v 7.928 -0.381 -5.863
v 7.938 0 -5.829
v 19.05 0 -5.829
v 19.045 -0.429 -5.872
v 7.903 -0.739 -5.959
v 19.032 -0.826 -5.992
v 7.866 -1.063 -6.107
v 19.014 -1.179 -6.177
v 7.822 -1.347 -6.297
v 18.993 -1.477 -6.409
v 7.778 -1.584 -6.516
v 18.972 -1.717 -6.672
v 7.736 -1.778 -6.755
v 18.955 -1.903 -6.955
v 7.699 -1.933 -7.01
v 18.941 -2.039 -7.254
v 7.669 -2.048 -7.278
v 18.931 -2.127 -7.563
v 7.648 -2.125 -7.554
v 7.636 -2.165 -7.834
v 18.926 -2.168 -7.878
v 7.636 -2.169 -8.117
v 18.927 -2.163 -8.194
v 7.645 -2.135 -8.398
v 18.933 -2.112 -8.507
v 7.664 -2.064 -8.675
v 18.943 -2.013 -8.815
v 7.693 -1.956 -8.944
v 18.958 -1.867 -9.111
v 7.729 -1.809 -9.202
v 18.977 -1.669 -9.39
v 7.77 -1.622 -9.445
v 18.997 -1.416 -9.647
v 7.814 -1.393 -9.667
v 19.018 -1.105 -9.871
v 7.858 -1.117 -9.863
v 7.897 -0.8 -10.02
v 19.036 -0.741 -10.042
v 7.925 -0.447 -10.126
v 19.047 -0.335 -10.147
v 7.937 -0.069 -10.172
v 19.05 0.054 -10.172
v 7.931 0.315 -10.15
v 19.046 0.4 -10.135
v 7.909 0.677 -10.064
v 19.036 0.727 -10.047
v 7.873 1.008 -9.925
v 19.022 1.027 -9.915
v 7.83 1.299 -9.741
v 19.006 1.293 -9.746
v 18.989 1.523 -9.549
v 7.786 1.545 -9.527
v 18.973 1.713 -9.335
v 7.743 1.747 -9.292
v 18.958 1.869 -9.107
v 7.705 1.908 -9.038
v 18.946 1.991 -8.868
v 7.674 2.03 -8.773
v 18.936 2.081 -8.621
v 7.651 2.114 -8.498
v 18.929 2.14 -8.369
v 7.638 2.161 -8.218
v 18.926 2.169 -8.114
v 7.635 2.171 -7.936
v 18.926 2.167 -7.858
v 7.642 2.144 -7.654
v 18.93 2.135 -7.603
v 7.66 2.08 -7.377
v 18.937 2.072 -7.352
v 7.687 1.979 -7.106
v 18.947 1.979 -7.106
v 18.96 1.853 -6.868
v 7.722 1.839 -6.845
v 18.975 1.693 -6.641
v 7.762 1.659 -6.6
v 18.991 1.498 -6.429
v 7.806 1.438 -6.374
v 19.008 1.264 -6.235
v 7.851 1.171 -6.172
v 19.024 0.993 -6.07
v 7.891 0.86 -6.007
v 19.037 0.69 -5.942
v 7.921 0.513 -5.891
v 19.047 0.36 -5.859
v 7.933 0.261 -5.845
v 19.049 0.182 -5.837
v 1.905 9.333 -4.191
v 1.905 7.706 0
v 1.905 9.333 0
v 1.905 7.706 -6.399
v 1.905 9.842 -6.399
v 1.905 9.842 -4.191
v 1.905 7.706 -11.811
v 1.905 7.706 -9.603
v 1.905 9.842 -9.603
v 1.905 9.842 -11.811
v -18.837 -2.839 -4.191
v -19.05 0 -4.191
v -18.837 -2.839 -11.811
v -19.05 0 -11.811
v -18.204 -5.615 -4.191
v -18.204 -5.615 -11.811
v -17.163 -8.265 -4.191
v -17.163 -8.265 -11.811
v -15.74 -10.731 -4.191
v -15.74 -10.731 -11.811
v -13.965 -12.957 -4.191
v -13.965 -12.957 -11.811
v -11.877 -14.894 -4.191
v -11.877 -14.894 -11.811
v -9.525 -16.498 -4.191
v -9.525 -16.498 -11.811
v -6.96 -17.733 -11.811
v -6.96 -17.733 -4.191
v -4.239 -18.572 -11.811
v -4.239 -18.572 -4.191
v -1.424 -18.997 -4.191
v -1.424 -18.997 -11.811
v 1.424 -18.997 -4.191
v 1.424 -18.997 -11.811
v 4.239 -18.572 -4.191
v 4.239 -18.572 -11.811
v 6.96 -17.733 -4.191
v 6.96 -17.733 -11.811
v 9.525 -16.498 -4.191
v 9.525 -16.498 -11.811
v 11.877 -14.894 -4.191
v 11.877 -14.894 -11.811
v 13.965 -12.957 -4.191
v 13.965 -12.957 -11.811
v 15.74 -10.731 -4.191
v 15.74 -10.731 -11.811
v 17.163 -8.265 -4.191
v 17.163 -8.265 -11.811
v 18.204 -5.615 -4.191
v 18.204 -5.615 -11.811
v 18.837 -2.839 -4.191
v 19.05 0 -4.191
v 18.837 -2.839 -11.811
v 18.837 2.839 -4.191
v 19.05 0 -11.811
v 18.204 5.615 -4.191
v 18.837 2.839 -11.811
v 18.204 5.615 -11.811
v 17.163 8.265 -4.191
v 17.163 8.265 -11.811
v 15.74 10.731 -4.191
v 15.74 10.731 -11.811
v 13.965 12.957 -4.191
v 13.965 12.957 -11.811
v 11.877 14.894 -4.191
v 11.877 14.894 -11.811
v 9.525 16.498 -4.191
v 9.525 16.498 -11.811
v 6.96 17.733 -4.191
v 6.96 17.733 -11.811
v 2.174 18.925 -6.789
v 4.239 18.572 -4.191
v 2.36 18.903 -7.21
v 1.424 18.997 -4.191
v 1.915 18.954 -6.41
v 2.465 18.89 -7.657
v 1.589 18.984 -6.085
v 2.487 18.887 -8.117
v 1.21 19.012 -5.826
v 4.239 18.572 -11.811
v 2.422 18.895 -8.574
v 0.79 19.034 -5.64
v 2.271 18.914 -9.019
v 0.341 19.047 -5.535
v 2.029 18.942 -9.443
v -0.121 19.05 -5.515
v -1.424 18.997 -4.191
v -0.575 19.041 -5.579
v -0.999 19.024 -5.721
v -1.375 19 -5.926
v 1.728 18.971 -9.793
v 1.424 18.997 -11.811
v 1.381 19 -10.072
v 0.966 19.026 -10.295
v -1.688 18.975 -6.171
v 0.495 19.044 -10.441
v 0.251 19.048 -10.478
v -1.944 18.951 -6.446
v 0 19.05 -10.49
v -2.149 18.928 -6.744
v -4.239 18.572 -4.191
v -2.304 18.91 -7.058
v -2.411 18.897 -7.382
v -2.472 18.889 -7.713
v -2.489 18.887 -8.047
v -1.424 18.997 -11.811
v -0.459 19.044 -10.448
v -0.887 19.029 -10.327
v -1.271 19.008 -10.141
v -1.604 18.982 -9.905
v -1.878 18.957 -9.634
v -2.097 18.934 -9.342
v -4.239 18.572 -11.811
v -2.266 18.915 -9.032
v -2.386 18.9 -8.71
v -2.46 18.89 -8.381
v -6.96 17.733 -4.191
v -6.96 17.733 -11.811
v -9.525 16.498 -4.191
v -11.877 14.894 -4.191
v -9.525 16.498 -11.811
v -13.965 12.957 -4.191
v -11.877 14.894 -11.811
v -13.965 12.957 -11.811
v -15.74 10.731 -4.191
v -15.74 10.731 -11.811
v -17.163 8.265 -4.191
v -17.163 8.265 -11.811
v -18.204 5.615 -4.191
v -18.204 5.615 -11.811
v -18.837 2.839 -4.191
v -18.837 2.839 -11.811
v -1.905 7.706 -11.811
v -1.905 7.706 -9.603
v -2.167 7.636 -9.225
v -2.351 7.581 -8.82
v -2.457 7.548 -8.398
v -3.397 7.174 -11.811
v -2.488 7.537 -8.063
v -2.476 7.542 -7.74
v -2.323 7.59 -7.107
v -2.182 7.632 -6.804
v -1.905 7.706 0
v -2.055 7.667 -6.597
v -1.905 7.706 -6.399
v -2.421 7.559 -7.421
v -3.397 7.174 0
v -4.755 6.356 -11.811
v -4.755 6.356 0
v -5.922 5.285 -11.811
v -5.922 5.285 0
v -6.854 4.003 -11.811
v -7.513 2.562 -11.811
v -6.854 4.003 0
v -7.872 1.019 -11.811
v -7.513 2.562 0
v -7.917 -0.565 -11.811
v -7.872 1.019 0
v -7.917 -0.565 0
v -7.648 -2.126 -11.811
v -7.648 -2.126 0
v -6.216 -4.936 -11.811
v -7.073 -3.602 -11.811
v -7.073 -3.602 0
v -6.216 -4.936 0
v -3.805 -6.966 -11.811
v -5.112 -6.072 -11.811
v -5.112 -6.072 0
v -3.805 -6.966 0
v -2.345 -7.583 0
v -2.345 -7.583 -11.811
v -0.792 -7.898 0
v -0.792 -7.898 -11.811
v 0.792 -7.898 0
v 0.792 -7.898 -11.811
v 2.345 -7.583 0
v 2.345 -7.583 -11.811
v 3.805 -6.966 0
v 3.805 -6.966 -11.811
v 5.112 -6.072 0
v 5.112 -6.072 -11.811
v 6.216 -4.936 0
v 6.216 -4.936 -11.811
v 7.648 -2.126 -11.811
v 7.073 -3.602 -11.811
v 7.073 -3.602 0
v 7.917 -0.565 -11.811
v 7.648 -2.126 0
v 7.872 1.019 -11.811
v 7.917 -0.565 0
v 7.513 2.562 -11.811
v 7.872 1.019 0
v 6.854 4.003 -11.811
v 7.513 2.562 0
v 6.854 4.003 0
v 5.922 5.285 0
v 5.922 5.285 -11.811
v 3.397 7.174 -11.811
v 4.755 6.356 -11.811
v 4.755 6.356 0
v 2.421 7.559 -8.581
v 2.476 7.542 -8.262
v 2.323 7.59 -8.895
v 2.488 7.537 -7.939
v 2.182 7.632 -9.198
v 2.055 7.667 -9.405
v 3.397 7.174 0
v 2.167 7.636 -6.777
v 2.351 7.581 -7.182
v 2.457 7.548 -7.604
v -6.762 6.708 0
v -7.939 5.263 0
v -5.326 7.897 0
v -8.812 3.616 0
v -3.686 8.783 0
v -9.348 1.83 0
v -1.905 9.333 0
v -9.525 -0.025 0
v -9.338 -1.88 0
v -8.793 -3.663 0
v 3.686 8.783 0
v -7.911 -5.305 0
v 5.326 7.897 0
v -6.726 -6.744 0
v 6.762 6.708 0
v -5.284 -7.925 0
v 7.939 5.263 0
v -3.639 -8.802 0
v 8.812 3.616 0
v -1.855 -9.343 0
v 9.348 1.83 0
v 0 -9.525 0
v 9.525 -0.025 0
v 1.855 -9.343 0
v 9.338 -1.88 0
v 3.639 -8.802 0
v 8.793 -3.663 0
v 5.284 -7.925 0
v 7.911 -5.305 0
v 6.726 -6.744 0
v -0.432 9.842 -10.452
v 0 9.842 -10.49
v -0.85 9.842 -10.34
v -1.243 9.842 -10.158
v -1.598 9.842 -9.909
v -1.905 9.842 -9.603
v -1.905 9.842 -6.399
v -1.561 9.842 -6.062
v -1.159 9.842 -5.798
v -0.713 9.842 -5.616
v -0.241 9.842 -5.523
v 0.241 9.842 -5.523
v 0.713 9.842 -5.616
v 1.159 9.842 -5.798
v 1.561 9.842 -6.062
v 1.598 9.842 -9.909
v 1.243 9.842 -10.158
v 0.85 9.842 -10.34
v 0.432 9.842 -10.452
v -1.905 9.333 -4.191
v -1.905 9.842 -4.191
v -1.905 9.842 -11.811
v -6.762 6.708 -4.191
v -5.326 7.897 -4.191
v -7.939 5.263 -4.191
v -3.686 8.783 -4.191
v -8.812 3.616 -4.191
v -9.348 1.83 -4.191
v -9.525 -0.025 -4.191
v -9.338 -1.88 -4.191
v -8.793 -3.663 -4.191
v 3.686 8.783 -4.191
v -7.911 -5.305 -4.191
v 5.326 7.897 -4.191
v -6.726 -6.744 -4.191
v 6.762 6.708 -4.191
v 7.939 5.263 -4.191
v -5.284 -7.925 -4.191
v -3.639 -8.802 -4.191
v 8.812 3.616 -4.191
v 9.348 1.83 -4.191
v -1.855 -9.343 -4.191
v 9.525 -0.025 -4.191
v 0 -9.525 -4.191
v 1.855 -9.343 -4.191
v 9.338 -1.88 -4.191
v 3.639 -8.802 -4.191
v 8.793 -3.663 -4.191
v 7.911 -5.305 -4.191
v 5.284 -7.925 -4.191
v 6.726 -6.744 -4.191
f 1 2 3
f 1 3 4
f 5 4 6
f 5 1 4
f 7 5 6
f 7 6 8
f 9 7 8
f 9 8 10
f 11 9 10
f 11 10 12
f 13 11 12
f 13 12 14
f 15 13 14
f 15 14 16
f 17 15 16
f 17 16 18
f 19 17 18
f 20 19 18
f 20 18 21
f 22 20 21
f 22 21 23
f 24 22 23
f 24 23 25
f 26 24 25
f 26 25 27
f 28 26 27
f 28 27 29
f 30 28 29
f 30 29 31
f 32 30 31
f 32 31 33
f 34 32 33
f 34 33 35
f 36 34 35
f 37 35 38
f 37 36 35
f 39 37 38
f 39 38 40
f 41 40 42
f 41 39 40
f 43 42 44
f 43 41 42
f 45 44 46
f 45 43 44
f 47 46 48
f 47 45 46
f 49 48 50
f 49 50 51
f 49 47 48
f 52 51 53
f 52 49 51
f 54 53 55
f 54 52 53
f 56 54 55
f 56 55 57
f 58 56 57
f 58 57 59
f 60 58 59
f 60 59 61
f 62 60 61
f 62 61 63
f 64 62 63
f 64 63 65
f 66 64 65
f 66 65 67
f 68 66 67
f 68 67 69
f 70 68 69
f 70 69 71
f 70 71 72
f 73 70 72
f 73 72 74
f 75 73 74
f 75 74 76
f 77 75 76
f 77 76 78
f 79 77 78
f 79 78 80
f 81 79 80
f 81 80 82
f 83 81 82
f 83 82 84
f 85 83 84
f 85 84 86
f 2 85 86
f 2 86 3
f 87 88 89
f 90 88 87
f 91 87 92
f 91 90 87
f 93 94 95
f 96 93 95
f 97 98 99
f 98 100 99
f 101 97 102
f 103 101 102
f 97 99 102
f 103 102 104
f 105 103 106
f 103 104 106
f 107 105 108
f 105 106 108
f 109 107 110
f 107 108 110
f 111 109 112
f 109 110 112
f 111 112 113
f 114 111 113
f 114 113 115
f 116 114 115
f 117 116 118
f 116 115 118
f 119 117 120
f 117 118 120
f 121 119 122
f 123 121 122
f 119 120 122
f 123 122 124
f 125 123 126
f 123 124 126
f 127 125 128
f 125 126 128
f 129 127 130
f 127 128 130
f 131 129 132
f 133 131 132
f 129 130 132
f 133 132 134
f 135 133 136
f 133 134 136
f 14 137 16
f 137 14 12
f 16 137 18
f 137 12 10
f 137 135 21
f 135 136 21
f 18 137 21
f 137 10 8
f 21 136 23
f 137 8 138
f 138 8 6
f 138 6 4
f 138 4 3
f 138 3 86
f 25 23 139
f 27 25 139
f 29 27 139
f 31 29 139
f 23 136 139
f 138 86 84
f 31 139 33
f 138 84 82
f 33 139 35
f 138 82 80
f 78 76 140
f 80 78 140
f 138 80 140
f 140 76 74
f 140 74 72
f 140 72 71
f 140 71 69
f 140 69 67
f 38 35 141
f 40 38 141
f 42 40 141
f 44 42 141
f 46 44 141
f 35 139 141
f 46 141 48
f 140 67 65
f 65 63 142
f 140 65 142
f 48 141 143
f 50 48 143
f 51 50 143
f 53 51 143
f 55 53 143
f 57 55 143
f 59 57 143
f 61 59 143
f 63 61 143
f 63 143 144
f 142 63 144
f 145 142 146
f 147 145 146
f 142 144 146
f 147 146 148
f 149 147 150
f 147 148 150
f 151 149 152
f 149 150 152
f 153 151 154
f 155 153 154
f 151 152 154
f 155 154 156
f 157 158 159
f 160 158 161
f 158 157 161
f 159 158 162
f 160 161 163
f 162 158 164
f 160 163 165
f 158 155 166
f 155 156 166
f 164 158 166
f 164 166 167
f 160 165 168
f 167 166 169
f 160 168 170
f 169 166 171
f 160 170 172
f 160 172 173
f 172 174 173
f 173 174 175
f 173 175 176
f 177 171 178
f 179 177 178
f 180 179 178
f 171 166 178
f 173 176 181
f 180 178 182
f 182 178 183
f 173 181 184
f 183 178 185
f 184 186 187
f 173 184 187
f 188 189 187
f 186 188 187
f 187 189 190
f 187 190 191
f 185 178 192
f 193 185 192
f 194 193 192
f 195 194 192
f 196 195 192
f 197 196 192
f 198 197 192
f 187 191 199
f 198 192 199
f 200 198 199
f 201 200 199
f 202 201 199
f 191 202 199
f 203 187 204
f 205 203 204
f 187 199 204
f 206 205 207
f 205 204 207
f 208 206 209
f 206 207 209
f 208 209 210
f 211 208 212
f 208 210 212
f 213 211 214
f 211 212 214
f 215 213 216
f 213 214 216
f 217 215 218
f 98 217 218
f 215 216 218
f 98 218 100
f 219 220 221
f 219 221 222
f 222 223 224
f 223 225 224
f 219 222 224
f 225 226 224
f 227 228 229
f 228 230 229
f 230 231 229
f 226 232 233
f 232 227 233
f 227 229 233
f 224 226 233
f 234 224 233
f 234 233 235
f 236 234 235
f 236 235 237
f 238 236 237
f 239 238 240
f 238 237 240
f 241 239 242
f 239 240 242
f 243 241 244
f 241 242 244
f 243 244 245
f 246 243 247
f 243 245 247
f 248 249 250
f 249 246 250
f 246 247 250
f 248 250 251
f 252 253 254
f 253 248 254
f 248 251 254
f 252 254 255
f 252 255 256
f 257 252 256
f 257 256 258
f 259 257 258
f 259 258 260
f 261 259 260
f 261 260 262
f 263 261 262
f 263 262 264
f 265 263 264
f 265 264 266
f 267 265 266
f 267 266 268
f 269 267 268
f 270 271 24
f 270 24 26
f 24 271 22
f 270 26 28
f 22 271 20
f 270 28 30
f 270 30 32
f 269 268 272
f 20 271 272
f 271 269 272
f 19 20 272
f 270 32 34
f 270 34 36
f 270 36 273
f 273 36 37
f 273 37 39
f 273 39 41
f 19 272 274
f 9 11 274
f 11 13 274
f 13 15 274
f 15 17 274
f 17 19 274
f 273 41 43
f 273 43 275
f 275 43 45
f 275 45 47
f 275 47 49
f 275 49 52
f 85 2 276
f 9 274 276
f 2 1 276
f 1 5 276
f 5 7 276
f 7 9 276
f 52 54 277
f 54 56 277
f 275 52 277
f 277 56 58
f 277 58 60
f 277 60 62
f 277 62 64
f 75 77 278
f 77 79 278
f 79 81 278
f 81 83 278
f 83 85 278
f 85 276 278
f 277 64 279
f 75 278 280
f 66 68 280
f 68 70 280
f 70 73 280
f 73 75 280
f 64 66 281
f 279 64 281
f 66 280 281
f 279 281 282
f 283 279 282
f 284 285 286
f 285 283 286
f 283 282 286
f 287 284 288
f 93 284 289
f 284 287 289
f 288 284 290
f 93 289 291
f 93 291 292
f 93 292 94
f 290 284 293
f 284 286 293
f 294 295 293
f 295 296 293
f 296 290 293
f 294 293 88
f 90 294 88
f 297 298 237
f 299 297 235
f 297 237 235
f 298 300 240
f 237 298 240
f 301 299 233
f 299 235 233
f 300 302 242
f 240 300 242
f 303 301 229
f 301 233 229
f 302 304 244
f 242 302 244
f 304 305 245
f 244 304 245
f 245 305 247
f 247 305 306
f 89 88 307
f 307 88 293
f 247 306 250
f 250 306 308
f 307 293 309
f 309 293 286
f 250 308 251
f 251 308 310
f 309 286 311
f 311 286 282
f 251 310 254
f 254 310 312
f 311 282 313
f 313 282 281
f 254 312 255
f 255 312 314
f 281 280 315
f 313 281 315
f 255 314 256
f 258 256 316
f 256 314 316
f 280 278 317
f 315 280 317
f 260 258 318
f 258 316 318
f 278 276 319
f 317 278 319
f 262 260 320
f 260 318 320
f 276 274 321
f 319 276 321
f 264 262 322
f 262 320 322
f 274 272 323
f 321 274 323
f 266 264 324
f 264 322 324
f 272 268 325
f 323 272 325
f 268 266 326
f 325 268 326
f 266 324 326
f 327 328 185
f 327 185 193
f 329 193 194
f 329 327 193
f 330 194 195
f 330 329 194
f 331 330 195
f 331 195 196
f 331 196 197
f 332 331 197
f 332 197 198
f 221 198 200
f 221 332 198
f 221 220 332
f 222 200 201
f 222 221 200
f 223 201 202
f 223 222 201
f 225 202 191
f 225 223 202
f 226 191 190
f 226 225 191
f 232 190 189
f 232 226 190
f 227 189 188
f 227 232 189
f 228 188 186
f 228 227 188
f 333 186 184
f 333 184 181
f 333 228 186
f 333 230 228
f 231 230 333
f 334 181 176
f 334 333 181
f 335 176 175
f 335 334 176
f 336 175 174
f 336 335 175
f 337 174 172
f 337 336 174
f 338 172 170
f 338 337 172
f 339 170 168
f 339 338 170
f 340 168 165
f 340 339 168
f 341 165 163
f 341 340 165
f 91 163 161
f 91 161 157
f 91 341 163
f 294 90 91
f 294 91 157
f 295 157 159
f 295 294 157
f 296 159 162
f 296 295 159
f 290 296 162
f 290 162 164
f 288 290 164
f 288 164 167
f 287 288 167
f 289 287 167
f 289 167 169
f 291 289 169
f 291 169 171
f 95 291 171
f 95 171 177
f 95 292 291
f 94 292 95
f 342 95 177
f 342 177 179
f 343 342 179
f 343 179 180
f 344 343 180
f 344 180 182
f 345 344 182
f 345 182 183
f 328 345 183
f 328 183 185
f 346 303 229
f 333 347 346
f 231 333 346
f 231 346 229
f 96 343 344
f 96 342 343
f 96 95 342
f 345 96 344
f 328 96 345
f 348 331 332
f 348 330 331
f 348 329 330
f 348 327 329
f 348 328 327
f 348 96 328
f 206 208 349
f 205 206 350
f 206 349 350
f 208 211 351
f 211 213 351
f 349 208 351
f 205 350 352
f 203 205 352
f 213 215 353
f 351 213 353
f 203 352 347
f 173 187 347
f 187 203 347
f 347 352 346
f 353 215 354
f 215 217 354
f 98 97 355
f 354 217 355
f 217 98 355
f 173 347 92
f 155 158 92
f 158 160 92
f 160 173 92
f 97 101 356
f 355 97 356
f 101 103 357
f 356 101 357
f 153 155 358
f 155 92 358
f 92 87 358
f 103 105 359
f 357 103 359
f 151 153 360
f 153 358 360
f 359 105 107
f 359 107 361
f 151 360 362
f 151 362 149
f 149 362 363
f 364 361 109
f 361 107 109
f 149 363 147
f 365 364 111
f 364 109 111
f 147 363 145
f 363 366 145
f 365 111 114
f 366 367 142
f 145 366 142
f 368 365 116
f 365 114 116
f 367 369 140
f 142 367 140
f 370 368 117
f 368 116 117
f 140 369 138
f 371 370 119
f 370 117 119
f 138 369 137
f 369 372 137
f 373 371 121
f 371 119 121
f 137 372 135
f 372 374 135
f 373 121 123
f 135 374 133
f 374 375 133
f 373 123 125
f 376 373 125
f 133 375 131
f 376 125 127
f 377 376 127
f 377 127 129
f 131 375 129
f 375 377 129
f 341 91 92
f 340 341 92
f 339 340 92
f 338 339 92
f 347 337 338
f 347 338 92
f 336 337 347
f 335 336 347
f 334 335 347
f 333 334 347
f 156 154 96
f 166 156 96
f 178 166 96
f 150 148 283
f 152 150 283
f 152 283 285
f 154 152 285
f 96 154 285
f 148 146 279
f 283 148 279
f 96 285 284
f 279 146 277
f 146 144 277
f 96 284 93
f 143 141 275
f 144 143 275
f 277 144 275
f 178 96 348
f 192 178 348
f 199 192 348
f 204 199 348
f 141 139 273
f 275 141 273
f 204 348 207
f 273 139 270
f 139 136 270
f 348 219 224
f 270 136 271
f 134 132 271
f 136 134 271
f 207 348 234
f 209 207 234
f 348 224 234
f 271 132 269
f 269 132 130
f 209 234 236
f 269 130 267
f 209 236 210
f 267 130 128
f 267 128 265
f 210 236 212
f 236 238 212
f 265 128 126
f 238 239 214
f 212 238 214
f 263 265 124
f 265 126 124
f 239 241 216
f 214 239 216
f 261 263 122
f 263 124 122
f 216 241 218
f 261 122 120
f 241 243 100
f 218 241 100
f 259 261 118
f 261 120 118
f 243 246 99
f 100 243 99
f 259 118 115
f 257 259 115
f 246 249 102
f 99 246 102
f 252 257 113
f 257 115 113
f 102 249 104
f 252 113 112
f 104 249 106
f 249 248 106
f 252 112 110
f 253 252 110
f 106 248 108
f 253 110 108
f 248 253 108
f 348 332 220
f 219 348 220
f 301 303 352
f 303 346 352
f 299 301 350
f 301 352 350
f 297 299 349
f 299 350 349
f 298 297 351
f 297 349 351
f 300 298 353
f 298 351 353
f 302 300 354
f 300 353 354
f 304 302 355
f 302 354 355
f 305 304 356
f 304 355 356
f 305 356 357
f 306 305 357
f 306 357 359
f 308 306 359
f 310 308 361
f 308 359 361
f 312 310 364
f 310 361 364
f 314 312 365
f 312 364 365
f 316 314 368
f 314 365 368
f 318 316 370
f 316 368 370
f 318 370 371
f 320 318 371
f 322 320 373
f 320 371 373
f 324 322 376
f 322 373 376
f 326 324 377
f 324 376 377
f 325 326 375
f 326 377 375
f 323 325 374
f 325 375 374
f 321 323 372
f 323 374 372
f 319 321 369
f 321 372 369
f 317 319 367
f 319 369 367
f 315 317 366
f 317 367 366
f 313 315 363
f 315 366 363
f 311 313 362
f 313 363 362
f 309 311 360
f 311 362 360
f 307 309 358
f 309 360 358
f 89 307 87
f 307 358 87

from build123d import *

# Parameters (mm, degrees)
EXTRUDE1_REACH      = 31.416
EXTRUDE2_REACH      = 31.416
EXTRUDE2_END_RADIUS = 19.05
SKETCH3_R           = 2.4892
EXTRUDE3_REACH      = 31.416
EXTRUDE3_END_RADIUS = 19.05
SKETCH4_R           = 2.1717


with BuildPart() as part:
    # Sketch1 → Revolve1 (revolve)
    with BuildSketch(Plane(origin=(0, 0, 0), x_dir=(1, 0, 0), z_dir=(0, 1, 0)), mode=Mode.PRIVATE) as revolve1_sk:
        Polygon((7.9375, 11.811), (7.9375, 0), (9.525, 0), (9.525, 4.191), (19.05, 4.191), (19.05, 11.811), align=None)
    revolve(revolve1_sk.sketch.rotate(Axis((0, 0, -72.820126568), (0, 0, 1)), 180), axis=Axis((0, 0, -72.820126568), (0, 0, 1)))

    # Extrude1: up to this face of the body (flat: up to its plane)
    extrude1_end = Plane(part.part.faces().sort_by_distance((8.206907684, 0, 0))[0])
    # Sketch2 → Extrude1 (cut, up to the picked face)
    with BuildSketch(Plane(origin=(0, 0, -11.811), x_dir=(-1, 0, 0), z_dir=(0, 0, -1)), mode=Mode.PRIVATE) as extrude1_sk1:
        with BuildLine():
            Line((1.905, 9.8425), (1.905, 7.705509798))
            ThreePointArc((1.905, 7.705509798), (0, -7.9375), (-1.905, 7.705509798))
            Line((-1.905, 7.705509798), (-1.905, 9.8425))
            Line((-1.905, 9.8425), (1.905, 9.8425))
        make_face()
    extrude1_tool1 = split(extrude(extrude1_sk1.sketch, amount=-EXTRUDE1_REACH, mode=Mode.PRIVATE), bisect_by=extrude1_end, keep=Keep.BOTH, mode=Mode.PRIVATE)
    add(extrude1_tool1.solids().sort_by(Axis((0, 0.325226, -11.811), (0, 0, 1)))[0], mode=Mode.SUBTRACT)

    # Extrude2: up to this cylinder (the profile starts inside it)
    extrude2_end = Plane(origin=(0, 0, -8.001), z_dir=(0, 0, -1)) * Cylinder(EXTRUDE2_END_RADIUS, 101.932, mode=Mode.PRIVATE)
    # Sketch3 → Extrude2 (cut, up to the surface)
    with BuildSketch(Plane(origin=(0, 0, 0), x_dir=(1, 0, 0), z_dir=(0, 1, 0)), mode=Mode.PRIVATE) as extrude2_sk1:
        with Locations(Location((0, 8.001, 0), (0, 0, 90))):
            Circle(SKETCH3_R)
    extrude2_tool1 = extrude(extrude2_sk1.sketch, amount=EXTRUDE2_REACH, mode=Mode.PRIVATE) & extrude2_end
    add(extrude2_tool1.solids().sort_by_distance((0, 0, -8.001))[0], mode=Mode.SUBTRACT)

    # Extrude3: up to this cylinder (the profile starts inside it)
    extrude3_end = Plane(origin=(0, 0, -8.001), z_dir=(0, 0, -1)) * Cylinder(EXTRUDE3_END_RADIUS, 101.932, mode=Mode.PRIVATE)
    # Sketch4 → Extrude3 (cut, up to the surface)
    with BuildSketch(Plane(origin=(0, 0, 0), x_dir=(0, 0, -1), z_dir=(1, 0, 0)), mode=Mode.PRIVATE) as extrude3_sk1:
        with Locations(Location((8.001, 0, 0), (0, 0, 180))):
            Circle(SKETCH4_R)
    extrude3_tool1 = extrude(extrude3_sk1.sketch, amount=EXTRUDE3_REACH, mode=Mode.PRIVATE) & extrude3_end
    add(extrude3_tool1.solids().sort_by_distance((0, 0, -8.001))[0], mode=Mode.SUBTRACT)


solid = part.part
